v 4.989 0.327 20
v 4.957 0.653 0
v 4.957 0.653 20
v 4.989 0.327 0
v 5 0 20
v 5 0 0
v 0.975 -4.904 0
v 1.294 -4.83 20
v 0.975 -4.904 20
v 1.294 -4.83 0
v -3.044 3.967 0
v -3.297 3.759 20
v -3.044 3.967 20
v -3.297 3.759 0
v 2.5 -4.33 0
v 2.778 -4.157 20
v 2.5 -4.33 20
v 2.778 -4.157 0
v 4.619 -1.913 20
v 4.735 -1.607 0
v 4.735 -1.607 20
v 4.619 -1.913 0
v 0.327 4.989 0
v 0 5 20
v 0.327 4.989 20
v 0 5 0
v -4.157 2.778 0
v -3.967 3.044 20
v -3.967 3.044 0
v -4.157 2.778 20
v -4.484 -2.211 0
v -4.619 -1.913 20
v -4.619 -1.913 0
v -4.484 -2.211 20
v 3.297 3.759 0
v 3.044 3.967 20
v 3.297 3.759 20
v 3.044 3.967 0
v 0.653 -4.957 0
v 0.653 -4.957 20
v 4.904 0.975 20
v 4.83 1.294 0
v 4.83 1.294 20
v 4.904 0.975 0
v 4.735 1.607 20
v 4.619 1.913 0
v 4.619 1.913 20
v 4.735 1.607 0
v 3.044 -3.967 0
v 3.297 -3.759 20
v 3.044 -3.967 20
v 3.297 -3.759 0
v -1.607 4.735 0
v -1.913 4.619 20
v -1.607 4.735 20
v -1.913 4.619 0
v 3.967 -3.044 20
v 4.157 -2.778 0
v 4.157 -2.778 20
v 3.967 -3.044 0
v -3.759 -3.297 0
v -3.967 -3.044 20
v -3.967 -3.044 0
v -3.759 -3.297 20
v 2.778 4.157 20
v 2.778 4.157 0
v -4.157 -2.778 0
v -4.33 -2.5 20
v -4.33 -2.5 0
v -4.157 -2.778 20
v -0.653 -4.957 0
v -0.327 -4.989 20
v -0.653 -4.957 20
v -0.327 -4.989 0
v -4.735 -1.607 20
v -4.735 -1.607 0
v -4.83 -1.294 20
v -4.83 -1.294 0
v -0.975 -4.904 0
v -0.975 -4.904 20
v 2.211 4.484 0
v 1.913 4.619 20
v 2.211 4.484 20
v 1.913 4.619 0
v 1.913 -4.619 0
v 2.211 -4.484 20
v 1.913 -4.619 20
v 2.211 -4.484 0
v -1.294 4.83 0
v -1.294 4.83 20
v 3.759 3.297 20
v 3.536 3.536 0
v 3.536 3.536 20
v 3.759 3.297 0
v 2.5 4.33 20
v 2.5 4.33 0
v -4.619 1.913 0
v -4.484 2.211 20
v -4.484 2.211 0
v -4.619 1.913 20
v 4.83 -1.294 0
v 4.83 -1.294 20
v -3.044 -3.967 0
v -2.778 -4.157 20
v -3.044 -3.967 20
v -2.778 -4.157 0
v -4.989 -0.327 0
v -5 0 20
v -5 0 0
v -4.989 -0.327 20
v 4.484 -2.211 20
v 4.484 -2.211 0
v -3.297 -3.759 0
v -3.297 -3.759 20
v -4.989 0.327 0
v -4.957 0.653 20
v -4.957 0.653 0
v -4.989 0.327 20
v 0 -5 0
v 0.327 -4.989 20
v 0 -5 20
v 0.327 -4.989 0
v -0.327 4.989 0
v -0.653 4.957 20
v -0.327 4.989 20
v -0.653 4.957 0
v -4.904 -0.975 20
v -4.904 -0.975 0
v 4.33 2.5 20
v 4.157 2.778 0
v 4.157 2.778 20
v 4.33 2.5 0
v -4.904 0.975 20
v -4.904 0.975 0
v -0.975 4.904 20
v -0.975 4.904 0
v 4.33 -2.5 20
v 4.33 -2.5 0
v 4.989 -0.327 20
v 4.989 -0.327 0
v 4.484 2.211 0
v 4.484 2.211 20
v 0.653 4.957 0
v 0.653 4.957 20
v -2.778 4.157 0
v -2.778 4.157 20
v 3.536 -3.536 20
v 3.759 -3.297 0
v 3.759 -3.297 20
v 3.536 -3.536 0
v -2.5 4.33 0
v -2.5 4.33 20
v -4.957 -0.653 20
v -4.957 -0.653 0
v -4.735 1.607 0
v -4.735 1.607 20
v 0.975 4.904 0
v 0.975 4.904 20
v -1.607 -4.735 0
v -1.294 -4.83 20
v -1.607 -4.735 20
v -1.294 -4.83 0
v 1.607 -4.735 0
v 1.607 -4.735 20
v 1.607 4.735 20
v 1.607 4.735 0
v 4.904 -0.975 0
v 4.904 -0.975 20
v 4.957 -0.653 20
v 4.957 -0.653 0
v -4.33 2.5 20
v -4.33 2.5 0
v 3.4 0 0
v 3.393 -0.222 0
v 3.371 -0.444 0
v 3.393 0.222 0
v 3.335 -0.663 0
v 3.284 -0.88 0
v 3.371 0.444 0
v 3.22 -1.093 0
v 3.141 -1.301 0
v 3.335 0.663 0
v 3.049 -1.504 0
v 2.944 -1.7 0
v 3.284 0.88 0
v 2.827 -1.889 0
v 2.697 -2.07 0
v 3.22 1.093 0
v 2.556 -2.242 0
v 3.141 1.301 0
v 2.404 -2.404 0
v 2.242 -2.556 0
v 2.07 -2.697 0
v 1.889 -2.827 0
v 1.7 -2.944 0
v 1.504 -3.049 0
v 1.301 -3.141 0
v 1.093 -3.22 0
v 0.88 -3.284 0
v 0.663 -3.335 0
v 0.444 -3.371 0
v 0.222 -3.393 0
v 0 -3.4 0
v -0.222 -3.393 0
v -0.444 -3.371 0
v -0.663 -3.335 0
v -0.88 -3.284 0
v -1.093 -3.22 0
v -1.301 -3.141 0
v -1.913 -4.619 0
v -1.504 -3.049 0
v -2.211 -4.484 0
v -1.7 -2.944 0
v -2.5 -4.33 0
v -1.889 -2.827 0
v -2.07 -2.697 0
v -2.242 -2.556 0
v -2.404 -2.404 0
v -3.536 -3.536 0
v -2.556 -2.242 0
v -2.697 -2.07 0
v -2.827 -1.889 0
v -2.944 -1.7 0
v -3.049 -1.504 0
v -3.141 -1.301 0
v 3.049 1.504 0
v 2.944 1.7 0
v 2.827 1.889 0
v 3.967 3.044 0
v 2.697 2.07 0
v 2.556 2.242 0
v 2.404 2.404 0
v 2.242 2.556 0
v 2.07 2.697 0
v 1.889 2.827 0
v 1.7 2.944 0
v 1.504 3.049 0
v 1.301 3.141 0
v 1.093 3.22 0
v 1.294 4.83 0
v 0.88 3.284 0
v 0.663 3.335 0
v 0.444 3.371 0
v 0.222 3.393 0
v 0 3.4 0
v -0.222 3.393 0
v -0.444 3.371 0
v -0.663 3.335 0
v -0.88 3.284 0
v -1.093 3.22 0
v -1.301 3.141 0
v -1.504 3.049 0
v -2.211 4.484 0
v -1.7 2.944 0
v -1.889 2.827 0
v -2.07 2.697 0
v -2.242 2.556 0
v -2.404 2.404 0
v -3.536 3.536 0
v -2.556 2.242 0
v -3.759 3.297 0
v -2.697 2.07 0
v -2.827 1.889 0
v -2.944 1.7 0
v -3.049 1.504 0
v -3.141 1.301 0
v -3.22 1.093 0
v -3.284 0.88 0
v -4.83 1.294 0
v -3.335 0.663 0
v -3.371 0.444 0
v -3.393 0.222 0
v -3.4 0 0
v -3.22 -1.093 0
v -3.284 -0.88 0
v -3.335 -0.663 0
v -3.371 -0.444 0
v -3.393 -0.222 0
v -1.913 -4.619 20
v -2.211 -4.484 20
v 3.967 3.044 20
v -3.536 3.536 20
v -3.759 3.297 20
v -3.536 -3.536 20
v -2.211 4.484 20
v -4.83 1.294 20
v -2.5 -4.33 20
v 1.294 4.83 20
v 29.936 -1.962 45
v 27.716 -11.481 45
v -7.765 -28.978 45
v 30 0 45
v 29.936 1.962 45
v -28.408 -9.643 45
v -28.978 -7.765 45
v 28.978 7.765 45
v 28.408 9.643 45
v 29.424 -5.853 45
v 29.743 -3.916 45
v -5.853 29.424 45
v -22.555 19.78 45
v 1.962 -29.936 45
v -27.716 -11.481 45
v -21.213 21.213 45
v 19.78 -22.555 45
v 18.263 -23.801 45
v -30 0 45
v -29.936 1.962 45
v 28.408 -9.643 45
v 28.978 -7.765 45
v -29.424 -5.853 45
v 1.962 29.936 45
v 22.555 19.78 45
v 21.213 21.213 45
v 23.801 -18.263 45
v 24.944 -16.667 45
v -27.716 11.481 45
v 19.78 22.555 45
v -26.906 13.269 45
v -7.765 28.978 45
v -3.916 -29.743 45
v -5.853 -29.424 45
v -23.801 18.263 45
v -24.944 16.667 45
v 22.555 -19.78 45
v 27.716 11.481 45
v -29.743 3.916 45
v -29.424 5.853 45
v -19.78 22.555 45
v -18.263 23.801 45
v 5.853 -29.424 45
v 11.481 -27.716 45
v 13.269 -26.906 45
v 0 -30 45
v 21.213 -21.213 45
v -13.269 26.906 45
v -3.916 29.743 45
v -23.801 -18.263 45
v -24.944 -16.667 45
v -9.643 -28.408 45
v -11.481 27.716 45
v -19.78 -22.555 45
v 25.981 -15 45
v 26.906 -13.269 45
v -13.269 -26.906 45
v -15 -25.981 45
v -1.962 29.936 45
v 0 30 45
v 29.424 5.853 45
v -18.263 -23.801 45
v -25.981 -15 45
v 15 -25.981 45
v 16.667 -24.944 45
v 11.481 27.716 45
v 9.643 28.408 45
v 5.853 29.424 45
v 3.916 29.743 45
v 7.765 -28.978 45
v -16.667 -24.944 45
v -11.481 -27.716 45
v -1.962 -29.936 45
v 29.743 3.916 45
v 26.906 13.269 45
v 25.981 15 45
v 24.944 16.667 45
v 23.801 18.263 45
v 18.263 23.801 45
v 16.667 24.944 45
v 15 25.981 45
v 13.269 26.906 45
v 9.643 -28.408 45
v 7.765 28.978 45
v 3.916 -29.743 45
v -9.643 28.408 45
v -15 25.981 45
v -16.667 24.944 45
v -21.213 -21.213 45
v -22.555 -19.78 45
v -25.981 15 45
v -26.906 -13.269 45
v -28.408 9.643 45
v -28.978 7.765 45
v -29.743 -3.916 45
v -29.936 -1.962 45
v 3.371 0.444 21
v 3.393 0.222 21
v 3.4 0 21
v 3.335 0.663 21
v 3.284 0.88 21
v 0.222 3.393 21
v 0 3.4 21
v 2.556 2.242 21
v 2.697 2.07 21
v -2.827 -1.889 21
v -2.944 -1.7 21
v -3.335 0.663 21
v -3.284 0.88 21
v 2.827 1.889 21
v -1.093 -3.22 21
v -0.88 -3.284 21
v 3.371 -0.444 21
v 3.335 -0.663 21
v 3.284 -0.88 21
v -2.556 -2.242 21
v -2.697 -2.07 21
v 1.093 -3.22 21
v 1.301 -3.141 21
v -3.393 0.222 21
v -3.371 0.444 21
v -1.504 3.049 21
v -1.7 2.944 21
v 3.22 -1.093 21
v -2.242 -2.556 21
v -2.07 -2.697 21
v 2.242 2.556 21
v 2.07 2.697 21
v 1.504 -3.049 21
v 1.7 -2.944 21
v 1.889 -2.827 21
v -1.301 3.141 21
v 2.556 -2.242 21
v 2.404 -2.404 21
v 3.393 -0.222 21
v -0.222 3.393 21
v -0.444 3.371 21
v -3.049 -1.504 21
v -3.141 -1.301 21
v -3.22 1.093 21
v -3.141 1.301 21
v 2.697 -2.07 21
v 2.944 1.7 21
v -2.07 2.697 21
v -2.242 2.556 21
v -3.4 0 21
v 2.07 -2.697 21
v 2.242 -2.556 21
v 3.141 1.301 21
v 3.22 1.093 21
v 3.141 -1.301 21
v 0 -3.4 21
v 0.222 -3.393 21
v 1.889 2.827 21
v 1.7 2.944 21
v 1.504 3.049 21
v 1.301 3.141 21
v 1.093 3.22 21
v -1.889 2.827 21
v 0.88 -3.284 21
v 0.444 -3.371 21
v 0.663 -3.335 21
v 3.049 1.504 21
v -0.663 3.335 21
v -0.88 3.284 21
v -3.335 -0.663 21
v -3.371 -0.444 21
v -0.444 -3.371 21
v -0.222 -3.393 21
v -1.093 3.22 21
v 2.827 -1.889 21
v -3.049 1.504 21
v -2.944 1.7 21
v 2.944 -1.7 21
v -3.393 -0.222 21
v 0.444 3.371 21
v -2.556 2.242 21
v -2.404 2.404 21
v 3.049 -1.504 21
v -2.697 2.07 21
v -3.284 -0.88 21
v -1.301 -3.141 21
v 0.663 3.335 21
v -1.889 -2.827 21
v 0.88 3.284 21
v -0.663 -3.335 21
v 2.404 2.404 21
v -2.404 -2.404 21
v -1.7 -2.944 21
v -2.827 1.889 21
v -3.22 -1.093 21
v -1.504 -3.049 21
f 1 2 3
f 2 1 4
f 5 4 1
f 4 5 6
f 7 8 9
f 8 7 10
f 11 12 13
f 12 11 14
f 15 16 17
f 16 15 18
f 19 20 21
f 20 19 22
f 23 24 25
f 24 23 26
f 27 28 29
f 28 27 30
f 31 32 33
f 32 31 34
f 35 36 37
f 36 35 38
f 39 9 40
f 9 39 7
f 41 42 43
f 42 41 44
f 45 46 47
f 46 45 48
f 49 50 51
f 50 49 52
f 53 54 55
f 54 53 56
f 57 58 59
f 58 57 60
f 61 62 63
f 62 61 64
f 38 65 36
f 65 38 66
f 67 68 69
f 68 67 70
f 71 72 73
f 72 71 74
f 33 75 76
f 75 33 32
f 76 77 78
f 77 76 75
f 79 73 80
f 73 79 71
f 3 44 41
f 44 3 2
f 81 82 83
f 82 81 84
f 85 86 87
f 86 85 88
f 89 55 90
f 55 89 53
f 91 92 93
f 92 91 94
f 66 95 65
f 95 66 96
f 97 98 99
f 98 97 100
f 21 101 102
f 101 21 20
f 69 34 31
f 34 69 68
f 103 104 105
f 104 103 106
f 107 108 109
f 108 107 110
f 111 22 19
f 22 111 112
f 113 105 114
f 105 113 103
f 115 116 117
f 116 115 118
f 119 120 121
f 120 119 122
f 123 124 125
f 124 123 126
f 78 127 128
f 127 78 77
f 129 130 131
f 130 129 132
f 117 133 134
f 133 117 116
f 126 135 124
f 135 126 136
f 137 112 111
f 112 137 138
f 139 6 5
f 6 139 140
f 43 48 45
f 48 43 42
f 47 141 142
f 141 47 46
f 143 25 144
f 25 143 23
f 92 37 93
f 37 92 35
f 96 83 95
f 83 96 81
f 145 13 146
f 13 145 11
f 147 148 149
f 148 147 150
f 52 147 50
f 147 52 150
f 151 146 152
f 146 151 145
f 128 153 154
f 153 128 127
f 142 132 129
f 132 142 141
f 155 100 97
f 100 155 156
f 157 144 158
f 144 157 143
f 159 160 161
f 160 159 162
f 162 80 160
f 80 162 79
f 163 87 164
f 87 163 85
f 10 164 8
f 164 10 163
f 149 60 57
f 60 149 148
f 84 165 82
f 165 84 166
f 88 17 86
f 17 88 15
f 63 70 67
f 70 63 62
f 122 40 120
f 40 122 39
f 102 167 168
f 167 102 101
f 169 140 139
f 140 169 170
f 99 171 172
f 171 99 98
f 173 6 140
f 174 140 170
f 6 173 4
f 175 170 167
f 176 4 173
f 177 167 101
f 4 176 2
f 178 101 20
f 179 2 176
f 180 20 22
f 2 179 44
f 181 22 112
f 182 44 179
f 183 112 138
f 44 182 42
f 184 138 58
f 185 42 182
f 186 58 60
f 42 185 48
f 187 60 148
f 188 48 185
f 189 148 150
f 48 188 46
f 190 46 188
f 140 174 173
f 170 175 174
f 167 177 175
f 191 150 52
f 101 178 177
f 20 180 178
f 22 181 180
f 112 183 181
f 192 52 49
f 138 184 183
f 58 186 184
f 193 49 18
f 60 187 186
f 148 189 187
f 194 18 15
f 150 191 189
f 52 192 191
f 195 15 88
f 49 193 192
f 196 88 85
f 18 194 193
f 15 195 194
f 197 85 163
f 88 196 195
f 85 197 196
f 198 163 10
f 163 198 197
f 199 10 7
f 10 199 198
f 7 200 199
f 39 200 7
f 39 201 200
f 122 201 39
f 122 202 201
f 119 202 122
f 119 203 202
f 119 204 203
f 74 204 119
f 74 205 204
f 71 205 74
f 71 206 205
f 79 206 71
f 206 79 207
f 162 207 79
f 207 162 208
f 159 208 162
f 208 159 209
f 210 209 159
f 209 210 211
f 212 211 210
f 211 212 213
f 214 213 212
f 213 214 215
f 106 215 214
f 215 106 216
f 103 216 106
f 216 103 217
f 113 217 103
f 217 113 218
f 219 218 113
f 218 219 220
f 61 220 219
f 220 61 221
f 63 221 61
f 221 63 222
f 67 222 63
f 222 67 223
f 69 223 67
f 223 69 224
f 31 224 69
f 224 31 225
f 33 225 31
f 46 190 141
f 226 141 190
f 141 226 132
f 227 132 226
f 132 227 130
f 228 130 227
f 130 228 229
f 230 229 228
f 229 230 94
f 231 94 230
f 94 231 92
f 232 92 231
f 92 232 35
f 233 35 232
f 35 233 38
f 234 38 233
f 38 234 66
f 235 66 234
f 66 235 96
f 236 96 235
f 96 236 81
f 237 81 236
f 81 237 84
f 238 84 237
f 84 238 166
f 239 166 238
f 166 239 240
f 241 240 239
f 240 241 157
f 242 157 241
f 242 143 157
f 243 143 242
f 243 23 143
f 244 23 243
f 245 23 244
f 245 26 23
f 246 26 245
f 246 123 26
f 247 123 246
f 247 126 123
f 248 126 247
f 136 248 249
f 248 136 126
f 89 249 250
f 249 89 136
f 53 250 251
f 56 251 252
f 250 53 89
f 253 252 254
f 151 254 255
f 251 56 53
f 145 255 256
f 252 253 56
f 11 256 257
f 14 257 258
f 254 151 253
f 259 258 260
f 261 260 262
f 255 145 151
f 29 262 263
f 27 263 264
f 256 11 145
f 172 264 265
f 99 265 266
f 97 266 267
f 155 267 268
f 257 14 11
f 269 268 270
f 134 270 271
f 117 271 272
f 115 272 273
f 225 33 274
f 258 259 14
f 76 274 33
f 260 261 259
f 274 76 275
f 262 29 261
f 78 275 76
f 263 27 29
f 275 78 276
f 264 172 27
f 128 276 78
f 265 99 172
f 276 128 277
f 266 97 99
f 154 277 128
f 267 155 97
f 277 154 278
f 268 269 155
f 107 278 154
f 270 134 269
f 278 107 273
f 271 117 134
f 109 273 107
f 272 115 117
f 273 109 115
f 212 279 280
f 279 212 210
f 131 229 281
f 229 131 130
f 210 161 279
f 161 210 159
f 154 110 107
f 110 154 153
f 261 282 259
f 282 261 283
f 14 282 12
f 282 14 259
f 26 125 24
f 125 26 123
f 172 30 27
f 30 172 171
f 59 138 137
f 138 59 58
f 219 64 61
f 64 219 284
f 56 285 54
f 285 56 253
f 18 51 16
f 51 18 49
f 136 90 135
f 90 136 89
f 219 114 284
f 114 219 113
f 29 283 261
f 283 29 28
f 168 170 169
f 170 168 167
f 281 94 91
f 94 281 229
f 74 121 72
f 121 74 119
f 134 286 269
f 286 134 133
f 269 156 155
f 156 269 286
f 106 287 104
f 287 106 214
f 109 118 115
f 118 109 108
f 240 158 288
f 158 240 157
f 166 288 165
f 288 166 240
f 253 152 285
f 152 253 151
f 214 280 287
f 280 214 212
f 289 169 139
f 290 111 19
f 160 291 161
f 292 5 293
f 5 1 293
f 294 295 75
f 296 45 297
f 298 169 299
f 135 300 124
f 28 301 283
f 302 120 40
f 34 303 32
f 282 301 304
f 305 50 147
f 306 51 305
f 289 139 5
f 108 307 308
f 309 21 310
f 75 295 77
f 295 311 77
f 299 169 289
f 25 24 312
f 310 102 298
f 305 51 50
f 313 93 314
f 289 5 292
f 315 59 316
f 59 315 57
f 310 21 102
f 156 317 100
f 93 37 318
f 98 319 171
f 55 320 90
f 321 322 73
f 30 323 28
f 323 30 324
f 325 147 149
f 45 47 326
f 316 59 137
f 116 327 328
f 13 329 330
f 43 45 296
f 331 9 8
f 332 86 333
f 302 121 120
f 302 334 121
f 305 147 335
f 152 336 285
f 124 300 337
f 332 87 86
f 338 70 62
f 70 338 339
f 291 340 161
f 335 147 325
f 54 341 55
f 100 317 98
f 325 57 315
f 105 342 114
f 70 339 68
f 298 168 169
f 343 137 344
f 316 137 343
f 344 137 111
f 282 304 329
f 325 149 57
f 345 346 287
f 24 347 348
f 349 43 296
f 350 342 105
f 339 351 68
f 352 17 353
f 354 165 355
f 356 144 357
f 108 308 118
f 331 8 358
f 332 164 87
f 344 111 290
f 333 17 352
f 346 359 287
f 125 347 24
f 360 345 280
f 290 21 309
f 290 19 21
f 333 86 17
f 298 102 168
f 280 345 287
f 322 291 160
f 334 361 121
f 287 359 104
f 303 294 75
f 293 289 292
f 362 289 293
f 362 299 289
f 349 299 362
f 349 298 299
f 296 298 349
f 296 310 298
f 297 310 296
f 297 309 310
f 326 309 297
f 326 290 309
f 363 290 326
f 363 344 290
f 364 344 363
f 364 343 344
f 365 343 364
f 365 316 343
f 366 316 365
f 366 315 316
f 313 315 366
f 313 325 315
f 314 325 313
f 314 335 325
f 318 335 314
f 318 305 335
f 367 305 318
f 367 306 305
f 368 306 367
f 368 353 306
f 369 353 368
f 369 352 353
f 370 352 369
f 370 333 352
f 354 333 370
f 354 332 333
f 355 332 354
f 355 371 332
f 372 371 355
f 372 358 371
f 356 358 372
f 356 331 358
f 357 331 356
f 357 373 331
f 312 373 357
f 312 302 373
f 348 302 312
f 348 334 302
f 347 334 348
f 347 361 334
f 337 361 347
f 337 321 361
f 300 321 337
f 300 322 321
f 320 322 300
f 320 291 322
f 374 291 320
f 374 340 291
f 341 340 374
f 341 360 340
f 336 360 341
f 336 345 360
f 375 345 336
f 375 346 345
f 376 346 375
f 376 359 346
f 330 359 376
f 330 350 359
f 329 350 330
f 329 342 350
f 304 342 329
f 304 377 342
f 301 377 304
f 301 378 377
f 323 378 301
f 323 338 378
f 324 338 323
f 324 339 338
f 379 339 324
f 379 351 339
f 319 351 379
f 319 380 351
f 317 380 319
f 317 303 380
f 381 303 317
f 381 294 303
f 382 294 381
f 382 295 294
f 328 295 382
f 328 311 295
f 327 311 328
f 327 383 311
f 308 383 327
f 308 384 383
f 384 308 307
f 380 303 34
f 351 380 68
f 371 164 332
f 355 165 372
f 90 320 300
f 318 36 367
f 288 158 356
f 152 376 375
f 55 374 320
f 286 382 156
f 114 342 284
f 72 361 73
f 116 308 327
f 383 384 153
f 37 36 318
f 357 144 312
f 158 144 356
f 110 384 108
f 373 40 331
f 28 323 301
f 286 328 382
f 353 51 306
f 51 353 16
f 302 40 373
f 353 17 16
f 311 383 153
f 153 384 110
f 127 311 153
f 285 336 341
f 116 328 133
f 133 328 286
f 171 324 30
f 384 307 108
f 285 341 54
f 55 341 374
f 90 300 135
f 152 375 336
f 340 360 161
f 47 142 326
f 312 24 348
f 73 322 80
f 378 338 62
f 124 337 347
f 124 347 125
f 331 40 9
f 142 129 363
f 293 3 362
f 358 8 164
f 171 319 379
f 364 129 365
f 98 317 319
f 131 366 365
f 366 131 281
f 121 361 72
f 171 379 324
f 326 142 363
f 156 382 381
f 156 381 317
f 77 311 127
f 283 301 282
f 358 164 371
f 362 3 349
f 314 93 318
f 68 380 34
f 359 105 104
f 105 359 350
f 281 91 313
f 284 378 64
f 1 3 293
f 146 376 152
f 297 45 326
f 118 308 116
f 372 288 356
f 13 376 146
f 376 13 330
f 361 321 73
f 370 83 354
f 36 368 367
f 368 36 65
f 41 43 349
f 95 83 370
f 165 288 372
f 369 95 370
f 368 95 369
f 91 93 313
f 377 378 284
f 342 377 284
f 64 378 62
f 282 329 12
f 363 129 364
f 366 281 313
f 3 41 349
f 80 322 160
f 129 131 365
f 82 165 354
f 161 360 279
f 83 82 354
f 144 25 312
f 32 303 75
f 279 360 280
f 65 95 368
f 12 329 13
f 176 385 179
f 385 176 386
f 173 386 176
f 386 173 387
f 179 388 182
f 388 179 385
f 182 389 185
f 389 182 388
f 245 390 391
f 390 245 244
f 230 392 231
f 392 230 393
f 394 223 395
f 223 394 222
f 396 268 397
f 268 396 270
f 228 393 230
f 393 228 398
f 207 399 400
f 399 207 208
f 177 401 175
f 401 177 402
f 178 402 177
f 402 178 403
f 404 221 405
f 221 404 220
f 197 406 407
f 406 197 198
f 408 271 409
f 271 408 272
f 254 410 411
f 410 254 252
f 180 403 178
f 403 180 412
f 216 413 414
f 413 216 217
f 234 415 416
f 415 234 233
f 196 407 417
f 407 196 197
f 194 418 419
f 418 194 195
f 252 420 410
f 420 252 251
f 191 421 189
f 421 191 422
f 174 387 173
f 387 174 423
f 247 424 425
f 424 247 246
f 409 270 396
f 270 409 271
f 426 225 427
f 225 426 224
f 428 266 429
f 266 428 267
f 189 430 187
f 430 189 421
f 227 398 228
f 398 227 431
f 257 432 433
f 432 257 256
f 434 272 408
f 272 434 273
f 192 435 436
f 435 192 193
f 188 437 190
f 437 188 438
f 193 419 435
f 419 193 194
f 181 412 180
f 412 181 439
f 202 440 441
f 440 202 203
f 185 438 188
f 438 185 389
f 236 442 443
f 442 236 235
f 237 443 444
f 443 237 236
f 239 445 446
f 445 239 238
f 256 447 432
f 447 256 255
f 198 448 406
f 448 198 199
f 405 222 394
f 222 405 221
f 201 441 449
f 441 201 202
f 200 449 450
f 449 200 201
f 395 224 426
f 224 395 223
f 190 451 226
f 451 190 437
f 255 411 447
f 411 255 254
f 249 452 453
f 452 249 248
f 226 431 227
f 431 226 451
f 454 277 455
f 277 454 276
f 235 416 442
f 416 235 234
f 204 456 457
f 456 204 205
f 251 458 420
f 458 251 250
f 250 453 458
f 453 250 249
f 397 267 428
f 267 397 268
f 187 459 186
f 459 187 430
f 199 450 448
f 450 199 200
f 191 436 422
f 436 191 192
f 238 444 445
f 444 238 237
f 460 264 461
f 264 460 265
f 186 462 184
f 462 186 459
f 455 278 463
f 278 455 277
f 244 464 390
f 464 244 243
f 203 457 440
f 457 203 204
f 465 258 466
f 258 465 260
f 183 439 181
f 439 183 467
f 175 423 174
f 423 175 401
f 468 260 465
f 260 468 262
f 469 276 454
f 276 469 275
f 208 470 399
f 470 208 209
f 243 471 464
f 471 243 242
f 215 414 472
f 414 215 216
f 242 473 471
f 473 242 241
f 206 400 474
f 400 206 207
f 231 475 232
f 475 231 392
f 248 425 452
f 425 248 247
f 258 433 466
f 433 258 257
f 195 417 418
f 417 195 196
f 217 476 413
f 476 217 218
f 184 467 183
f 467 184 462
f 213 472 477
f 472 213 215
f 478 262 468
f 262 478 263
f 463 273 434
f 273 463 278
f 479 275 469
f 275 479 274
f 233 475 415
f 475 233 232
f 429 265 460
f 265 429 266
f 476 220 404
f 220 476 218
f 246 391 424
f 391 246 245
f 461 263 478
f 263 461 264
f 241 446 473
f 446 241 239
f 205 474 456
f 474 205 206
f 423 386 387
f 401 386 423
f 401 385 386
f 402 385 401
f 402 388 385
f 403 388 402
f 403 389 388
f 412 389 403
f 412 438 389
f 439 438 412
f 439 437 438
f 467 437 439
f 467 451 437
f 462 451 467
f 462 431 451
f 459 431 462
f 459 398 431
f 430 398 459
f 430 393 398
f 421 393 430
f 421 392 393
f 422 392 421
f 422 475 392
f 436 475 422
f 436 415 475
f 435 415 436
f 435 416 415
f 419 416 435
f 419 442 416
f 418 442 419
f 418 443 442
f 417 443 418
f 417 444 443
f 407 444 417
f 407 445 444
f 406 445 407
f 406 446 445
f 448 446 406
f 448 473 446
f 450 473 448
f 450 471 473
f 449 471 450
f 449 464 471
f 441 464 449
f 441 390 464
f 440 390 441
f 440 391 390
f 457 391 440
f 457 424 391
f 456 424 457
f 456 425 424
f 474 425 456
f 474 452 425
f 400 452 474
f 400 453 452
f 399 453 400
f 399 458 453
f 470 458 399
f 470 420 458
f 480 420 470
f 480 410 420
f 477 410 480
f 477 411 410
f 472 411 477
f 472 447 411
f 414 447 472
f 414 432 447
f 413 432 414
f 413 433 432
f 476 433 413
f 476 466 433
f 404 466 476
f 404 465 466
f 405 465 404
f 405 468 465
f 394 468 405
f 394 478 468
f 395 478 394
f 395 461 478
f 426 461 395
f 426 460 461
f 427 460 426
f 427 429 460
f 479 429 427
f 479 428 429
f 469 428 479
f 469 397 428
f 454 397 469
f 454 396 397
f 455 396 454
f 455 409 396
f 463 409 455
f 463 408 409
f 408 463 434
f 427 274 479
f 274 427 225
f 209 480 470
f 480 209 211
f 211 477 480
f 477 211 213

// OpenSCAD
// Small lab funnel - printed upright, open at top and bottom
// Units: mm

$fn = 96;

// --- Dimensions ---
spout_od      = 10;    // spout outer diameter
spout_len     = 20;    // spout length (z = 0 to 20)
cone_bottom_d = 10;    // cone outer diameter at z = 20
cone_top_d    = 60;    // cone outer diameter at rim (z = 50)
wall          = 1.6;   // wall thickness everywhere

// --- Derived ---
spout_id = spout_od - 2 * wall;   // bore diameter (6.8 mm)
total_h  = spout_len + (cone_top_d - cone_bottom_d) / 2; // 50 mm

difference() {
    union() {
        // Spout (tube)
        cylinder(d = spout_od, h = spout_len);
        // Cone from spout top to rim
        translate([0, 0, spout_len])
            cylinder(d1 = cone_bottom_d, d2 = cone_top_d, h = total_h - spout_len);
    }
    // Bottom cut (through the bore)
    translate([0, 0, -1])
        cylinder(d = spout_id, h = spout_len + 2);
    // Top cut (open rim)
    translate([0, 0, total_h + 1])
        cylinder(d = cone_top_d, h = 2);
}
